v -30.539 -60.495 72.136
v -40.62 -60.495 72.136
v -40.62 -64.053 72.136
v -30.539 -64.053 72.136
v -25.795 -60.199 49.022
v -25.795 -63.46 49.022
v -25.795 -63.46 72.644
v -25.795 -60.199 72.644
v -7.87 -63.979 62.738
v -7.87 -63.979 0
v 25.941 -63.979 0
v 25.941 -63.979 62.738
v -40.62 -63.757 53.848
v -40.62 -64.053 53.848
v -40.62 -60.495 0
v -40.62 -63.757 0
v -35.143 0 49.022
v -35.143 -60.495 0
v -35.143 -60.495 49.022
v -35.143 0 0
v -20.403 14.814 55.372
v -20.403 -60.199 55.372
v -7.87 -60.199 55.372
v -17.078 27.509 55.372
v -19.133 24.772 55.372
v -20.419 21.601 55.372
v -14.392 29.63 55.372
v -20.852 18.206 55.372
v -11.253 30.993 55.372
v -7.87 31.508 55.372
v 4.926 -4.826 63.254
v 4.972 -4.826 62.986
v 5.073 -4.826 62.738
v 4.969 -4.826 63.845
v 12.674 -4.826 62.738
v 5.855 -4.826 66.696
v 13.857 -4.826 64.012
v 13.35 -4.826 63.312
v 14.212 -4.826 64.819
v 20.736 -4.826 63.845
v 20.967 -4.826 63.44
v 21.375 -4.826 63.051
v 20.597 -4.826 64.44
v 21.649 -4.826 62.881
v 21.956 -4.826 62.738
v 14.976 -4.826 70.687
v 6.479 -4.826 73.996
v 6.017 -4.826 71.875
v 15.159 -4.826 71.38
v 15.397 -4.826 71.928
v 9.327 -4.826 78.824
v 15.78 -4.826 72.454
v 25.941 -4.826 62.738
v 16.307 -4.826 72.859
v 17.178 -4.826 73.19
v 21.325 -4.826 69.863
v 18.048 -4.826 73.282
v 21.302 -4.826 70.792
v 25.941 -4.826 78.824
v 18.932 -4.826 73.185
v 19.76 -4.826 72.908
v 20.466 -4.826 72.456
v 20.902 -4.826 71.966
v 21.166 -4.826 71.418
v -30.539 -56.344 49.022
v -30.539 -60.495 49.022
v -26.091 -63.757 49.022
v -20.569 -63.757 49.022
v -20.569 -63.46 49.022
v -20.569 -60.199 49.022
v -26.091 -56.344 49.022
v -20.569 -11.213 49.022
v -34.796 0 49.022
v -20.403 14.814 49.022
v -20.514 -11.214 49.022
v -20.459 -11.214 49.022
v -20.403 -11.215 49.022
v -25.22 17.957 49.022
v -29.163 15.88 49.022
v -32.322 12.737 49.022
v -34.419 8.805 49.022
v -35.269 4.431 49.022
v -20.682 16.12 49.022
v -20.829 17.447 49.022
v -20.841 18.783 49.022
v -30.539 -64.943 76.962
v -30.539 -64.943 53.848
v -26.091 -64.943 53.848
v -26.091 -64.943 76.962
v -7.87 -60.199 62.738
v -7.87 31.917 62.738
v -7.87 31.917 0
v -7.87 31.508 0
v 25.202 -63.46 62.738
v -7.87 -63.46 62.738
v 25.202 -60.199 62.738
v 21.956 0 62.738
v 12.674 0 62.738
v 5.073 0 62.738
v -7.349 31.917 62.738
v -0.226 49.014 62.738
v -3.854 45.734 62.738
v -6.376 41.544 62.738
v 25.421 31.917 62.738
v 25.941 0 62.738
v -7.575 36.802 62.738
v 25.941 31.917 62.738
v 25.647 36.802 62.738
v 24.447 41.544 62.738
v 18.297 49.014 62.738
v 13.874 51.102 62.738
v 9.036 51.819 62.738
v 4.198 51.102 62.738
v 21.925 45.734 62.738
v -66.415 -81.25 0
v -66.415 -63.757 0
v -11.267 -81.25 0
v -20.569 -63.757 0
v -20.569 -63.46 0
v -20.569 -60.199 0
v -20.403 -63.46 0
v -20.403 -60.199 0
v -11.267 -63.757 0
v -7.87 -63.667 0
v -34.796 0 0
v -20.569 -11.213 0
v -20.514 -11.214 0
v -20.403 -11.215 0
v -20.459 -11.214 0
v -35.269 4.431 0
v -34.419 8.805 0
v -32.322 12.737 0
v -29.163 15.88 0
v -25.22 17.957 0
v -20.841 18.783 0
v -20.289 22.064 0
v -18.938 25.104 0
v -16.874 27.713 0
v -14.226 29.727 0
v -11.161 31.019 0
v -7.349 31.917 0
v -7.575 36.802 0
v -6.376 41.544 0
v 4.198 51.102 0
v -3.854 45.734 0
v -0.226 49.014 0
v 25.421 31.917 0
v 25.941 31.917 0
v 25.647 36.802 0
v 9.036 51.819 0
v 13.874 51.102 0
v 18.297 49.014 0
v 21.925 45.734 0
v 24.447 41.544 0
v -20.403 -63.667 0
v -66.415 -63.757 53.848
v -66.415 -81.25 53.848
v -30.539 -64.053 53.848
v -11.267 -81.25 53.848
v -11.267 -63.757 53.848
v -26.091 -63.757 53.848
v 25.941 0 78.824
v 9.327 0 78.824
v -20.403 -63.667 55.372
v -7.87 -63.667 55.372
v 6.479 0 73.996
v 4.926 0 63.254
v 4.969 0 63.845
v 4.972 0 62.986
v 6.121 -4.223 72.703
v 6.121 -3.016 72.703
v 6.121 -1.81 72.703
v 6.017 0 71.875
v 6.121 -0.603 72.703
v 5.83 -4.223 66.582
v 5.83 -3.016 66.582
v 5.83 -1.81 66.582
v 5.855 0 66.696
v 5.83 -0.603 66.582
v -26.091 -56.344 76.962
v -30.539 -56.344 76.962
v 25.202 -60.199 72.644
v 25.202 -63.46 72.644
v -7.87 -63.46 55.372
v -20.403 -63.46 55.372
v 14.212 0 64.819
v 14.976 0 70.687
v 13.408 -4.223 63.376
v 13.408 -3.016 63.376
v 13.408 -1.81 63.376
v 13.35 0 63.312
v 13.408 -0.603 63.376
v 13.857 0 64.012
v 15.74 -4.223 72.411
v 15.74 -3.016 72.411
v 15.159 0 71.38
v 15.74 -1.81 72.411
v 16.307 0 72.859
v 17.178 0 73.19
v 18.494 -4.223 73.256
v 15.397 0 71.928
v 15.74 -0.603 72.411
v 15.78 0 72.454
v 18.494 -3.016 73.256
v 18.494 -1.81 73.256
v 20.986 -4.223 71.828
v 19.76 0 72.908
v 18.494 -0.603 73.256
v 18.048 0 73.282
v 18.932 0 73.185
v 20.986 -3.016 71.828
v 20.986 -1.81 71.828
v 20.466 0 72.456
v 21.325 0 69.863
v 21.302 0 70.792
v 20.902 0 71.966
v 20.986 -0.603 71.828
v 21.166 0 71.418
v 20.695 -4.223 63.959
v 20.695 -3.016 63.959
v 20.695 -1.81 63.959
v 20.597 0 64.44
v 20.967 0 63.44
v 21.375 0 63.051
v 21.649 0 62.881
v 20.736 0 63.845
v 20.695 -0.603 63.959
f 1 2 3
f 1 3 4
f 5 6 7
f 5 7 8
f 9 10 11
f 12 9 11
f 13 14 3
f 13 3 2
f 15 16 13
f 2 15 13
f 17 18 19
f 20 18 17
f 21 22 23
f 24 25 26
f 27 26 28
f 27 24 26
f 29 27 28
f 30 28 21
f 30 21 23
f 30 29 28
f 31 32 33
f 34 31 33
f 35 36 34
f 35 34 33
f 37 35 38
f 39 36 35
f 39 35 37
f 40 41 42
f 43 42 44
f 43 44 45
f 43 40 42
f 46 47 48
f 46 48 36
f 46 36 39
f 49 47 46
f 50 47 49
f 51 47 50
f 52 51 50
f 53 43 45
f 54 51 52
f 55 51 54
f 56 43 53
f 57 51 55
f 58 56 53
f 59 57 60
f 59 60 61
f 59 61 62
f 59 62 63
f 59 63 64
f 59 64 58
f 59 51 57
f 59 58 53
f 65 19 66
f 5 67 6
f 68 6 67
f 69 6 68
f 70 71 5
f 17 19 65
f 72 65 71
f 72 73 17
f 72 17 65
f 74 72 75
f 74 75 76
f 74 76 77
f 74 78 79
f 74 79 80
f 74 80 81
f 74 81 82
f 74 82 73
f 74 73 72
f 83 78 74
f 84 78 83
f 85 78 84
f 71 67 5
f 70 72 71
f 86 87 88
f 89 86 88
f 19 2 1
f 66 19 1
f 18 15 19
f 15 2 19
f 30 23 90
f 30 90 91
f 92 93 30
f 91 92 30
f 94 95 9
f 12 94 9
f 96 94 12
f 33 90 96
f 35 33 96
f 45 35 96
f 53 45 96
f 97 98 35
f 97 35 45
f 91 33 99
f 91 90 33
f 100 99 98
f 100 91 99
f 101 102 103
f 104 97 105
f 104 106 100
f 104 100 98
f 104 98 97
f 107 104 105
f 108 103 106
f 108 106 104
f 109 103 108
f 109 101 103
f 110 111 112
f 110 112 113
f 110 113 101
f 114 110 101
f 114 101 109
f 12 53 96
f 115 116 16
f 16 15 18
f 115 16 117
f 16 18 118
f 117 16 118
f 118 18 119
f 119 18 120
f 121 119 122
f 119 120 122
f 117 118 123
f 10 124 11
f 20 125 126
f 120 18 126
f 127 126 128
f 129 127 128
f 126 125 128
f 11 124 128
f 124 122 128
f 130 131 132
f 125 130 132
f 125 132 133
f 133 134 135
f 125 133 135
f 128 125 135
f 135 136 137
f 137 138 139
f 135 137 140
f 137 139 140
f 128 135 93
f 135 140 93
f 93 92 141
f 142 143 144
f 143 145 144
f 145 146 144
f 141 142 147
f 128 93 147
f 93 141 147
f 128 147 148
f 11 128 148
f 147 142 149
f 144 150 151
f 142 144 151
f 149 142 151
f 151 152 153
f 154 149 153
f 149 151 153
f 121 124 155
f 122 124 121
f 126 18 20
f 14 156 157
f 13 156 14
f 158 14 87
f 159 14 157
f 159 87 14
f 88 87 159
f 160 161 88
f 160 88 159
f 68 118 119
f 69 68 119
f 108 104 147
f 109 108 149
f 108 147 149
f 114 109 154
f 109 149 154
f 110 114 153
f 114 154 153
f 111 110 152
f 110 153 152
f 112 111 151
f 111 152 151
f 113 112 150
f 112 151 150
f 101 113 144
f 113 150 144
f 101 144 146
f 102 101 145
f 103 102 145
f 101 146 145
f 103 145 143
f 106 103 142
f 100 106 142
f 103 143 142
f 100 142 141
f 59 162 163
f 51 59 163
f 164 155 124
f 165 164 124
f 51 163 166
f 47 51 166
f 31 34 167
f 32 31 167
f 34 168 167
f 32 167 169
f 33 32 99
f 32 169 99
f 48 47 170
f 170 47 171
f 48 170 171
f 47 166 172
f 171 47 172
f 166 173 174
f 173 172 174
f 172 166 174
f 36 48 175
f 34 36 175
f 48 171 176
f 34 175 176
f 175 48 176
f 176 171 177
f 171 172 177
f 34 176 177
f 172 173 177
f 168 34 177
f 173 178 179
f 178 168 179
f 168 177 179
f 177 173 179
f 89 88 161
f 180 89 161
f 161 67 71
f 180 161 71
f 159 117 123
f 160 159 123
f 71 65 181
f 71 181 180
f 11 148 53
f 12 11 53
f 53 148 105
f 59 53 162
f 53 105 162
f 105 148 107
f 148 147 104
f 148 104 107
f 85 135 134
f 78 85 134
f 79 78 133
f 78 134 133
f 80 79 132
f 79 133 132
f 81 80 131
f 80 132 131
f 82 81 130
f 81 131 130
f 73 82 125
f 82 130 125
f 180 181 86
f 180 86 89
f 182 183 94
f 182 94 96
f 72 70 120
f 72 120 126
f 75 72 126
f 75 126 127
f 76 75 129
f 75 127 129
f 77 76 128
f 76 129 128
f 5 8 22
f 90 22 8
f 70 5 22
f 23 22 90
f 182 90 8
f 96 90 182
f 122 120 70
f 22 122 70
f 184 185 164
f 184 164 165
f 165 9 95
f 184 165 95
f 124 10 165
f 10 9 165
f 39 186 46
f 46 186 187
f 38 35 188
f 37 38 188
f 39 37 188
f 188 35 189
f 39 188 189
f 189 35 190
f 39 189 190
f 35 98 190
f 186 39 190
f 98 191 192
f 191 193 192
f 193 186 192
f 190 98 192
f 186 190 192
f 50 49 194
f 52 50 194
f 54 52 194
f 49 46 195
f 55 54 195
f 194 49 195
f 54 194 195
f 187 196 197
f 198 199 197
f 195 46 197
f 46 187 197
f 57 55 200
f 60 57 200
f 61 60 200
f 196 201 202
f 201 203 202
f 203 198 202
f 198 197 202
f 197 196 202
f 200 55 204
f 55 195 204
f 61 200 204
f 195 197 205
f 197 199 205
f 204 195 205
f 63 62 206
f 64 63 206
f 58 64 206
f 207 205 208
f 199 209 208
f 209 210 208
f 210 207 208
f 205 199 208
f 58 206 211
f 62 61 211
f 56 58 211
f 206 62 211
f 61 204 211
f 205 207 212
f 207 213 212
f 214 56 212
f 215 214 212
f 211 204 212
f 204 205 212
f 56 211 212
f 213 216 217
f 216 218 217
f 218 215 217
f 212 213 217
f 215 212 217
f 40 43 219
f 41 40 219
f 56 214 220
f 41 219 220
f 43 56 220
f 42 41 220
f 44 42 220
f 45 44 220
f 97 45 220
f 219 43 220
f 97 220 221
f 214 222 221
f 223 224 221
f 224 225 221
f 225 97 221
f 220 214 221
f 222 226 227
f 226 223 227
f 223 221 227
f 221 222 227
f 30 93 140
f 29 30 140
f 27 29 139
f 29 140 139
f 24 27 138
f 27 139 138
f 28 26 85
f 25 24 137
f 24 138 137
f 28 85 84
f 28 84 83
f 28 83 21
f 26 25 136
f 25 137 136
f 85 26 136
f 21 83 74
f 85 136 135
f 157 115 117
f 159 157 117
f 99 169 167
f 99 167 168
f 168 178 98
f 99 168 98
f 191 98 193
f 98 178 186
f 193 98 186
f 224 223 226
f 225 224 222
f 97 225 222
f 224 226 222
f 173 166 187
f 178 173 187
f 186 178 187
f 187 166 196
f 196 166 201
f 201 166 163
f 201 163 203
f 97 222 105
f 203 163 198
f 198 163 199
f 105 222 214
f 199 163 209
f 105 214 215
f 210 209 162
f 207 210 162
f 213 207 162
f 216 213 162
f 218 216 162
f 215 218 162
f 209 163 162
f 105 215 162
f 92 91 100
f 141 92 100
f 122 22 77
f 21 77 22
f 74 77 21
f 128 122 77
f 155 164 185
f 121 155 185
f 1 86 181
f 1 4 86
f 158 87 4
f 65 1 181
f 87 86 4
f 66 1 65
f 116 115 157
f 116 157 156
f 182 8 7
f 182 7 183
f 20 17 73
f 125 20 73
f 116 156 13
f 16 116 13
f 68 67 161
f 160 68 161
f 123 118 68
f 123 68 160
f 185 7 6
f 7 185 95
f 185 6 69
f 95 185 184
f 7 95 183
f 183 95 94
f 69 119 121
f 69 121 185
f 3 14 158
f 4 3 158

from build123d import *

# Parameters (mm, degrees)
F0_R      = 16.6957172427
F1_DEPTH  = 62.738
F2_W      = 33.8111482561
F2_H      = 95.895409584
F3_DEPTH  = 62.738
F4_R      = 13.2741365626
F5_DEPTH  = 55.372
F6_W      = 12.5334430486
F6_H      = 82.7790144831
F7_DEPTH  = 55.372
F8_R      = 15.0046147667
F9_DEPTH  = 49.022
F10_W     = 14.5737715065
F10_H     = 64.1245916486
F11_DEPTH = 49.022
F13_DEPTH = 4.826
F14_W     = 4.4474024326
F14_H     = 8.5983164608
F15_DEPTH = 76.962
F16_W     = 50.9968847036
F16_H     = 3.2614283264
F17_DEPTH = 72.644
F18_W     = 10.0807789713
F18_H     = 3.5579204559
F19_DEPTH = 72.136
F20_W     = 55.1477968693
F20_H     = 17.4931138754
F21_DEPTH = 53.848


with BuildPart() as f1:
    # F0 (on Top) → F1 (new body)
    with BuildSketch(Plane.XY):
        with Locations((9.0357372537, 35.1227857172)):
            Circle(F0_R)
    extrude(amount=F1_DEPTH)

    # F2 (on Top) → F3 (join)
    with BuildSketch(Plane.XY):
        with Locations((9.035738185, -16.0311460495)):
            Rectangle(F2_W, F2_H)
    extrude(amount=F3_DEPTH)

    # F4 (on Top) → F5 (join)
    with BuildSketch(Plane.XY):
        with Locations((-7.5783608481, 18.2375591248)):
            Circle(F4_R)
    extrude(amount=F5_DEPTH)

    # F6 (on Top) → F7 (join)
    with BuildSketch(Plane.XY):
        with Locations((-14.1365574673, -22.2775219008)):
            Rectangle(F6_W, F6_H)
    extrude(amount=F7_DEPTH)

    # F8 (on Top) → F9 (join)
    with BuildSketch(Plane.XY):
        with Locations((-20.2778875828, 3.7891804241)):
            Circle(F8_R)
    extrude(amount=F9_DEPTH)

    # F10 (on Top) → F11 (join)
    with BuildSketch(Plane.XY):
        with Locations((-27.8562474996, -32.0622958243)):
            Rectangle(F10_W, F10_H)
    extrude(amount=F11_DEPTH)

    # F12 (on Front) → F13 (join)
    with BuildSketch(Plane.XZ):
        with BuildLine():
            add(Edge.make_bspline(
                [(9.3272132799, 78.8237527013), (7.9182853633, 76.8284104093), (5.182542099, 72.9540147279), (6.7369025998, 66.8272809439), (2.8994250841, 61.239011136), (16.8173248262, 61.1527732675), (12.9666307345, 74.2246924308), (23.7803791476, 73.080684286), (18.3812111376, 62.4937182841), (23.573835168, 62.2986103244), (25.9413123131, 62.2096545994)],
                knots=[0, 0, 0, 0, 0.128166769, 0.248863956, 0.3478557526, 0.4875439615, 0.6364878053, 0.7485115106, 0.8853386559, 1, 1, 1, 1], degree=3))
            Line((25.9413123131, 62.2096545994), (25.9413123131, 78.8237527013))
            Line((25.9413123131, 78.8237527013), (9.3272132799, 78.8237527013))
        make_face()
    extrude(amount=F13_DEPTH)

    # F14 (on Top) → F15 (join)
    with BuildSketch(Plane.XY):
        with Locations((-28.3151315525, -60.6435146183)):
            Rectangle(F14_W, F14_H)
    extrude(amount=F15_DEPTH)

    # F16 (on Top) → F17 (join)
    with BuildSketch(Plane.XY):
        with Locations((-0.2964939922, -61.8294868618)):
            Rectangle(F16_W, F16_H)
    extrude(amount=F17_DEPTH)

    # F18 (on Top) → F19 (join)
    with BuildSketch(Plane.XY):
        with Locations((-35.5792222545, -62.2742250562)):
            Rectangle(F18_W, F18_H)
    extrude(amount=F19_DEPTH)

    # F20 (on Top) → F21 (join)
    with BuildSketch(Plane.XY):
        with Locations((-38.8406515121, -72.5032538176)):
            Rectangle(F20_W, F20_H)
    extrude(amount=F21_DEPTH)


solid = f1.part
